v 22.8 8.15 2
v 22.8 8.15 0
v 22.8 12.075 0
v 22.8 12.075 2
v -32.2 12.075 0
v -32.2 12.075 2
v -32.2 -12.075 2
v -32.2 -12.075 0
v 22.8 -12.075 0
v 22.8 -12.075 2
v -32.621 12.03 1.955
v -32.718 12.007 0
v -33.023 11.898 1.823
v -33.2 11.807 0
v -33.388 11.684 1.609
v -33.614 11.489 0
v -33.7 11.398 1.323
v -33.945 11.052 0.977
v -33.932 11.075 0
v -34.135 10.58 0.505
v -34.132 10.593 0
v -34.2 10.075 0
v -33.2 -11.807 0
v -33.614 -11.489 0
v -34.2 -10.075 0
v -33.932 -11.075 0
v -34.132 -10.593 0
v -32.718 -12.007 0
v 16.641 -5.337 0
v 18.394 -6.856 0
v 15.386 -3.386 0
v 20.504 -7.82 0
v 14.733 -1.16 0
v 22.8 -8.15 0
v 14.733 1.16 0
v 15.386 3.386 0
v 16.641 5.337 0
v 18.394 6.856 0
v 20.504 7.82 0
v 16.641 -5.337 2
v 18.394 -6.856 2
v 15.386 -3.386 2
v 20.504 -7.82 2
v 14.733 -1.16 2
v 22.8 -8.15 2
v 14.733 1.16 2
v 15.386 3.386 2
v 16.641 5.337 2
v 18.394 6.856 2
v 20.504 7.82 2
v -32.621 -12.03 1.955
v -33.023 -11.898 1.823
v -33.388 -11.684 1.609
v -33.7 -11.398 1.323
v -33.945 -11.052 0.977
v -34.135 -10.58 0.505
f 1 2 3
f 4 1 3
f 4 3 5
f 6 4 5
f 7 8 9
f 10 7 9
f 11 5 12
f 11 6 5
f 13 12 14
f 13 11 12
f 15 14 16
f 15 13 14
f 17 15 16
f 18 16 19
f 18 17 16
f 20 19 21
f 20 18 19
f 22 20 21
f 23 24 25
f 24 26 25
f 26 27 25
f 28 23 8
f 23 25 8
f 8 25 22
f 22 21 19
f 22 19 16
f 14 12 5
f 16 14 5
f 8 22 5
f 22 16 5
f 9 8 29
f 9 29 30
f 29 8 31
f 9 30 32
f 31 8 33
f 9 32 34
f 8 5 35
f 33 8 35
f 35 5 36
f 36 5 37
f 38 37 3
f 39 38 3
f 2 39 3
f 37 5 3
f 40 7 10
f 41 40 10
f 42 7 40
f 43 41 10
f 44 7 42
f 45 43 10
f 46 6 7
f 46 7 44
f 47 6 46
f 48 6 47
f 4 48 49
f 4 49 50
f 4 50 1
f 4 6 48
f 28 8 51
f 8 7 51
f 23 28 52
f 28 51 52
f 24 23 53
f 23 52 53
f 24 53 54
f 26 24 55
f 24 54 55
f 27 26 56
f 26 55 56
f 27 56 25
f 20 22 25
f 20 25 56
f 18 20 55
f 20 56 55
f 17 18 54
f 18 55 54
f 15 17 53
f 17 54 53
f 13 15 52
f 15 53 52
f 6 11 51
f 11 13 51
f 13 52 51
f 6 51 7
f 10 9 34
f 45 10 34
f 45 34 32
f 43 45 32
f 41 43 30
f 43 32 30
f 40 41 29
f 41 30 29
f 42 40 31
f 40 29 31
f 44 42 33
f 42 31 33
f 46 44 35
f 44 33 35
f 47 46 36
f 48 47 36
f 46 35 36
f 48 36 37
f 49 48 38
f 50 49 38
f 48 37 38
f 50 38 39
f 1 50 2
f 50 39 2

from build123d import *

# Parameters (mm, degrees)
F1_DEPTH = 2
F2_R     = 1.99999


# Not quite as in the source:
# - a fillet or chamfer is up to 0.001 mm smaller than in the source, because OpenCascade refuses the exact size


with BuildPart() as f1:
    # F0 (on Top) → F1 (new body)
    with BuildSketch(Plane.XY):
        with BuildLine():
            Line((-34.2, -12.075), (22.8, -12.075))
            Line((22.8, -12.075), (22.8, -8.15))
            ThreePointArc((22.8, -8.15), (14.65, 0), (22.8, 8.15))
            Line((22.8, 8.15), (22.8, 12.075))
            Line((22.8, 12.075), (-34.2, 12.075))
            Line((-34.2, 12.075), (-34.2, -12.075))
        make_face()
    extrude(amount=F1_DEPTH)

    # F2 (radius 2 in the source; OpenCascade refuses exactly that, so slightly less here)
    f2_edges = [f1.edges().sort_by_distance(p)[0] for p in [
        (-34.2, -12.075, 1),
        (-34.2, 12.075, 1),
        (-34.2, 0, 2),
    ]]
    fillet(f2_edges, radius=F2_R)


solid = f1.part
